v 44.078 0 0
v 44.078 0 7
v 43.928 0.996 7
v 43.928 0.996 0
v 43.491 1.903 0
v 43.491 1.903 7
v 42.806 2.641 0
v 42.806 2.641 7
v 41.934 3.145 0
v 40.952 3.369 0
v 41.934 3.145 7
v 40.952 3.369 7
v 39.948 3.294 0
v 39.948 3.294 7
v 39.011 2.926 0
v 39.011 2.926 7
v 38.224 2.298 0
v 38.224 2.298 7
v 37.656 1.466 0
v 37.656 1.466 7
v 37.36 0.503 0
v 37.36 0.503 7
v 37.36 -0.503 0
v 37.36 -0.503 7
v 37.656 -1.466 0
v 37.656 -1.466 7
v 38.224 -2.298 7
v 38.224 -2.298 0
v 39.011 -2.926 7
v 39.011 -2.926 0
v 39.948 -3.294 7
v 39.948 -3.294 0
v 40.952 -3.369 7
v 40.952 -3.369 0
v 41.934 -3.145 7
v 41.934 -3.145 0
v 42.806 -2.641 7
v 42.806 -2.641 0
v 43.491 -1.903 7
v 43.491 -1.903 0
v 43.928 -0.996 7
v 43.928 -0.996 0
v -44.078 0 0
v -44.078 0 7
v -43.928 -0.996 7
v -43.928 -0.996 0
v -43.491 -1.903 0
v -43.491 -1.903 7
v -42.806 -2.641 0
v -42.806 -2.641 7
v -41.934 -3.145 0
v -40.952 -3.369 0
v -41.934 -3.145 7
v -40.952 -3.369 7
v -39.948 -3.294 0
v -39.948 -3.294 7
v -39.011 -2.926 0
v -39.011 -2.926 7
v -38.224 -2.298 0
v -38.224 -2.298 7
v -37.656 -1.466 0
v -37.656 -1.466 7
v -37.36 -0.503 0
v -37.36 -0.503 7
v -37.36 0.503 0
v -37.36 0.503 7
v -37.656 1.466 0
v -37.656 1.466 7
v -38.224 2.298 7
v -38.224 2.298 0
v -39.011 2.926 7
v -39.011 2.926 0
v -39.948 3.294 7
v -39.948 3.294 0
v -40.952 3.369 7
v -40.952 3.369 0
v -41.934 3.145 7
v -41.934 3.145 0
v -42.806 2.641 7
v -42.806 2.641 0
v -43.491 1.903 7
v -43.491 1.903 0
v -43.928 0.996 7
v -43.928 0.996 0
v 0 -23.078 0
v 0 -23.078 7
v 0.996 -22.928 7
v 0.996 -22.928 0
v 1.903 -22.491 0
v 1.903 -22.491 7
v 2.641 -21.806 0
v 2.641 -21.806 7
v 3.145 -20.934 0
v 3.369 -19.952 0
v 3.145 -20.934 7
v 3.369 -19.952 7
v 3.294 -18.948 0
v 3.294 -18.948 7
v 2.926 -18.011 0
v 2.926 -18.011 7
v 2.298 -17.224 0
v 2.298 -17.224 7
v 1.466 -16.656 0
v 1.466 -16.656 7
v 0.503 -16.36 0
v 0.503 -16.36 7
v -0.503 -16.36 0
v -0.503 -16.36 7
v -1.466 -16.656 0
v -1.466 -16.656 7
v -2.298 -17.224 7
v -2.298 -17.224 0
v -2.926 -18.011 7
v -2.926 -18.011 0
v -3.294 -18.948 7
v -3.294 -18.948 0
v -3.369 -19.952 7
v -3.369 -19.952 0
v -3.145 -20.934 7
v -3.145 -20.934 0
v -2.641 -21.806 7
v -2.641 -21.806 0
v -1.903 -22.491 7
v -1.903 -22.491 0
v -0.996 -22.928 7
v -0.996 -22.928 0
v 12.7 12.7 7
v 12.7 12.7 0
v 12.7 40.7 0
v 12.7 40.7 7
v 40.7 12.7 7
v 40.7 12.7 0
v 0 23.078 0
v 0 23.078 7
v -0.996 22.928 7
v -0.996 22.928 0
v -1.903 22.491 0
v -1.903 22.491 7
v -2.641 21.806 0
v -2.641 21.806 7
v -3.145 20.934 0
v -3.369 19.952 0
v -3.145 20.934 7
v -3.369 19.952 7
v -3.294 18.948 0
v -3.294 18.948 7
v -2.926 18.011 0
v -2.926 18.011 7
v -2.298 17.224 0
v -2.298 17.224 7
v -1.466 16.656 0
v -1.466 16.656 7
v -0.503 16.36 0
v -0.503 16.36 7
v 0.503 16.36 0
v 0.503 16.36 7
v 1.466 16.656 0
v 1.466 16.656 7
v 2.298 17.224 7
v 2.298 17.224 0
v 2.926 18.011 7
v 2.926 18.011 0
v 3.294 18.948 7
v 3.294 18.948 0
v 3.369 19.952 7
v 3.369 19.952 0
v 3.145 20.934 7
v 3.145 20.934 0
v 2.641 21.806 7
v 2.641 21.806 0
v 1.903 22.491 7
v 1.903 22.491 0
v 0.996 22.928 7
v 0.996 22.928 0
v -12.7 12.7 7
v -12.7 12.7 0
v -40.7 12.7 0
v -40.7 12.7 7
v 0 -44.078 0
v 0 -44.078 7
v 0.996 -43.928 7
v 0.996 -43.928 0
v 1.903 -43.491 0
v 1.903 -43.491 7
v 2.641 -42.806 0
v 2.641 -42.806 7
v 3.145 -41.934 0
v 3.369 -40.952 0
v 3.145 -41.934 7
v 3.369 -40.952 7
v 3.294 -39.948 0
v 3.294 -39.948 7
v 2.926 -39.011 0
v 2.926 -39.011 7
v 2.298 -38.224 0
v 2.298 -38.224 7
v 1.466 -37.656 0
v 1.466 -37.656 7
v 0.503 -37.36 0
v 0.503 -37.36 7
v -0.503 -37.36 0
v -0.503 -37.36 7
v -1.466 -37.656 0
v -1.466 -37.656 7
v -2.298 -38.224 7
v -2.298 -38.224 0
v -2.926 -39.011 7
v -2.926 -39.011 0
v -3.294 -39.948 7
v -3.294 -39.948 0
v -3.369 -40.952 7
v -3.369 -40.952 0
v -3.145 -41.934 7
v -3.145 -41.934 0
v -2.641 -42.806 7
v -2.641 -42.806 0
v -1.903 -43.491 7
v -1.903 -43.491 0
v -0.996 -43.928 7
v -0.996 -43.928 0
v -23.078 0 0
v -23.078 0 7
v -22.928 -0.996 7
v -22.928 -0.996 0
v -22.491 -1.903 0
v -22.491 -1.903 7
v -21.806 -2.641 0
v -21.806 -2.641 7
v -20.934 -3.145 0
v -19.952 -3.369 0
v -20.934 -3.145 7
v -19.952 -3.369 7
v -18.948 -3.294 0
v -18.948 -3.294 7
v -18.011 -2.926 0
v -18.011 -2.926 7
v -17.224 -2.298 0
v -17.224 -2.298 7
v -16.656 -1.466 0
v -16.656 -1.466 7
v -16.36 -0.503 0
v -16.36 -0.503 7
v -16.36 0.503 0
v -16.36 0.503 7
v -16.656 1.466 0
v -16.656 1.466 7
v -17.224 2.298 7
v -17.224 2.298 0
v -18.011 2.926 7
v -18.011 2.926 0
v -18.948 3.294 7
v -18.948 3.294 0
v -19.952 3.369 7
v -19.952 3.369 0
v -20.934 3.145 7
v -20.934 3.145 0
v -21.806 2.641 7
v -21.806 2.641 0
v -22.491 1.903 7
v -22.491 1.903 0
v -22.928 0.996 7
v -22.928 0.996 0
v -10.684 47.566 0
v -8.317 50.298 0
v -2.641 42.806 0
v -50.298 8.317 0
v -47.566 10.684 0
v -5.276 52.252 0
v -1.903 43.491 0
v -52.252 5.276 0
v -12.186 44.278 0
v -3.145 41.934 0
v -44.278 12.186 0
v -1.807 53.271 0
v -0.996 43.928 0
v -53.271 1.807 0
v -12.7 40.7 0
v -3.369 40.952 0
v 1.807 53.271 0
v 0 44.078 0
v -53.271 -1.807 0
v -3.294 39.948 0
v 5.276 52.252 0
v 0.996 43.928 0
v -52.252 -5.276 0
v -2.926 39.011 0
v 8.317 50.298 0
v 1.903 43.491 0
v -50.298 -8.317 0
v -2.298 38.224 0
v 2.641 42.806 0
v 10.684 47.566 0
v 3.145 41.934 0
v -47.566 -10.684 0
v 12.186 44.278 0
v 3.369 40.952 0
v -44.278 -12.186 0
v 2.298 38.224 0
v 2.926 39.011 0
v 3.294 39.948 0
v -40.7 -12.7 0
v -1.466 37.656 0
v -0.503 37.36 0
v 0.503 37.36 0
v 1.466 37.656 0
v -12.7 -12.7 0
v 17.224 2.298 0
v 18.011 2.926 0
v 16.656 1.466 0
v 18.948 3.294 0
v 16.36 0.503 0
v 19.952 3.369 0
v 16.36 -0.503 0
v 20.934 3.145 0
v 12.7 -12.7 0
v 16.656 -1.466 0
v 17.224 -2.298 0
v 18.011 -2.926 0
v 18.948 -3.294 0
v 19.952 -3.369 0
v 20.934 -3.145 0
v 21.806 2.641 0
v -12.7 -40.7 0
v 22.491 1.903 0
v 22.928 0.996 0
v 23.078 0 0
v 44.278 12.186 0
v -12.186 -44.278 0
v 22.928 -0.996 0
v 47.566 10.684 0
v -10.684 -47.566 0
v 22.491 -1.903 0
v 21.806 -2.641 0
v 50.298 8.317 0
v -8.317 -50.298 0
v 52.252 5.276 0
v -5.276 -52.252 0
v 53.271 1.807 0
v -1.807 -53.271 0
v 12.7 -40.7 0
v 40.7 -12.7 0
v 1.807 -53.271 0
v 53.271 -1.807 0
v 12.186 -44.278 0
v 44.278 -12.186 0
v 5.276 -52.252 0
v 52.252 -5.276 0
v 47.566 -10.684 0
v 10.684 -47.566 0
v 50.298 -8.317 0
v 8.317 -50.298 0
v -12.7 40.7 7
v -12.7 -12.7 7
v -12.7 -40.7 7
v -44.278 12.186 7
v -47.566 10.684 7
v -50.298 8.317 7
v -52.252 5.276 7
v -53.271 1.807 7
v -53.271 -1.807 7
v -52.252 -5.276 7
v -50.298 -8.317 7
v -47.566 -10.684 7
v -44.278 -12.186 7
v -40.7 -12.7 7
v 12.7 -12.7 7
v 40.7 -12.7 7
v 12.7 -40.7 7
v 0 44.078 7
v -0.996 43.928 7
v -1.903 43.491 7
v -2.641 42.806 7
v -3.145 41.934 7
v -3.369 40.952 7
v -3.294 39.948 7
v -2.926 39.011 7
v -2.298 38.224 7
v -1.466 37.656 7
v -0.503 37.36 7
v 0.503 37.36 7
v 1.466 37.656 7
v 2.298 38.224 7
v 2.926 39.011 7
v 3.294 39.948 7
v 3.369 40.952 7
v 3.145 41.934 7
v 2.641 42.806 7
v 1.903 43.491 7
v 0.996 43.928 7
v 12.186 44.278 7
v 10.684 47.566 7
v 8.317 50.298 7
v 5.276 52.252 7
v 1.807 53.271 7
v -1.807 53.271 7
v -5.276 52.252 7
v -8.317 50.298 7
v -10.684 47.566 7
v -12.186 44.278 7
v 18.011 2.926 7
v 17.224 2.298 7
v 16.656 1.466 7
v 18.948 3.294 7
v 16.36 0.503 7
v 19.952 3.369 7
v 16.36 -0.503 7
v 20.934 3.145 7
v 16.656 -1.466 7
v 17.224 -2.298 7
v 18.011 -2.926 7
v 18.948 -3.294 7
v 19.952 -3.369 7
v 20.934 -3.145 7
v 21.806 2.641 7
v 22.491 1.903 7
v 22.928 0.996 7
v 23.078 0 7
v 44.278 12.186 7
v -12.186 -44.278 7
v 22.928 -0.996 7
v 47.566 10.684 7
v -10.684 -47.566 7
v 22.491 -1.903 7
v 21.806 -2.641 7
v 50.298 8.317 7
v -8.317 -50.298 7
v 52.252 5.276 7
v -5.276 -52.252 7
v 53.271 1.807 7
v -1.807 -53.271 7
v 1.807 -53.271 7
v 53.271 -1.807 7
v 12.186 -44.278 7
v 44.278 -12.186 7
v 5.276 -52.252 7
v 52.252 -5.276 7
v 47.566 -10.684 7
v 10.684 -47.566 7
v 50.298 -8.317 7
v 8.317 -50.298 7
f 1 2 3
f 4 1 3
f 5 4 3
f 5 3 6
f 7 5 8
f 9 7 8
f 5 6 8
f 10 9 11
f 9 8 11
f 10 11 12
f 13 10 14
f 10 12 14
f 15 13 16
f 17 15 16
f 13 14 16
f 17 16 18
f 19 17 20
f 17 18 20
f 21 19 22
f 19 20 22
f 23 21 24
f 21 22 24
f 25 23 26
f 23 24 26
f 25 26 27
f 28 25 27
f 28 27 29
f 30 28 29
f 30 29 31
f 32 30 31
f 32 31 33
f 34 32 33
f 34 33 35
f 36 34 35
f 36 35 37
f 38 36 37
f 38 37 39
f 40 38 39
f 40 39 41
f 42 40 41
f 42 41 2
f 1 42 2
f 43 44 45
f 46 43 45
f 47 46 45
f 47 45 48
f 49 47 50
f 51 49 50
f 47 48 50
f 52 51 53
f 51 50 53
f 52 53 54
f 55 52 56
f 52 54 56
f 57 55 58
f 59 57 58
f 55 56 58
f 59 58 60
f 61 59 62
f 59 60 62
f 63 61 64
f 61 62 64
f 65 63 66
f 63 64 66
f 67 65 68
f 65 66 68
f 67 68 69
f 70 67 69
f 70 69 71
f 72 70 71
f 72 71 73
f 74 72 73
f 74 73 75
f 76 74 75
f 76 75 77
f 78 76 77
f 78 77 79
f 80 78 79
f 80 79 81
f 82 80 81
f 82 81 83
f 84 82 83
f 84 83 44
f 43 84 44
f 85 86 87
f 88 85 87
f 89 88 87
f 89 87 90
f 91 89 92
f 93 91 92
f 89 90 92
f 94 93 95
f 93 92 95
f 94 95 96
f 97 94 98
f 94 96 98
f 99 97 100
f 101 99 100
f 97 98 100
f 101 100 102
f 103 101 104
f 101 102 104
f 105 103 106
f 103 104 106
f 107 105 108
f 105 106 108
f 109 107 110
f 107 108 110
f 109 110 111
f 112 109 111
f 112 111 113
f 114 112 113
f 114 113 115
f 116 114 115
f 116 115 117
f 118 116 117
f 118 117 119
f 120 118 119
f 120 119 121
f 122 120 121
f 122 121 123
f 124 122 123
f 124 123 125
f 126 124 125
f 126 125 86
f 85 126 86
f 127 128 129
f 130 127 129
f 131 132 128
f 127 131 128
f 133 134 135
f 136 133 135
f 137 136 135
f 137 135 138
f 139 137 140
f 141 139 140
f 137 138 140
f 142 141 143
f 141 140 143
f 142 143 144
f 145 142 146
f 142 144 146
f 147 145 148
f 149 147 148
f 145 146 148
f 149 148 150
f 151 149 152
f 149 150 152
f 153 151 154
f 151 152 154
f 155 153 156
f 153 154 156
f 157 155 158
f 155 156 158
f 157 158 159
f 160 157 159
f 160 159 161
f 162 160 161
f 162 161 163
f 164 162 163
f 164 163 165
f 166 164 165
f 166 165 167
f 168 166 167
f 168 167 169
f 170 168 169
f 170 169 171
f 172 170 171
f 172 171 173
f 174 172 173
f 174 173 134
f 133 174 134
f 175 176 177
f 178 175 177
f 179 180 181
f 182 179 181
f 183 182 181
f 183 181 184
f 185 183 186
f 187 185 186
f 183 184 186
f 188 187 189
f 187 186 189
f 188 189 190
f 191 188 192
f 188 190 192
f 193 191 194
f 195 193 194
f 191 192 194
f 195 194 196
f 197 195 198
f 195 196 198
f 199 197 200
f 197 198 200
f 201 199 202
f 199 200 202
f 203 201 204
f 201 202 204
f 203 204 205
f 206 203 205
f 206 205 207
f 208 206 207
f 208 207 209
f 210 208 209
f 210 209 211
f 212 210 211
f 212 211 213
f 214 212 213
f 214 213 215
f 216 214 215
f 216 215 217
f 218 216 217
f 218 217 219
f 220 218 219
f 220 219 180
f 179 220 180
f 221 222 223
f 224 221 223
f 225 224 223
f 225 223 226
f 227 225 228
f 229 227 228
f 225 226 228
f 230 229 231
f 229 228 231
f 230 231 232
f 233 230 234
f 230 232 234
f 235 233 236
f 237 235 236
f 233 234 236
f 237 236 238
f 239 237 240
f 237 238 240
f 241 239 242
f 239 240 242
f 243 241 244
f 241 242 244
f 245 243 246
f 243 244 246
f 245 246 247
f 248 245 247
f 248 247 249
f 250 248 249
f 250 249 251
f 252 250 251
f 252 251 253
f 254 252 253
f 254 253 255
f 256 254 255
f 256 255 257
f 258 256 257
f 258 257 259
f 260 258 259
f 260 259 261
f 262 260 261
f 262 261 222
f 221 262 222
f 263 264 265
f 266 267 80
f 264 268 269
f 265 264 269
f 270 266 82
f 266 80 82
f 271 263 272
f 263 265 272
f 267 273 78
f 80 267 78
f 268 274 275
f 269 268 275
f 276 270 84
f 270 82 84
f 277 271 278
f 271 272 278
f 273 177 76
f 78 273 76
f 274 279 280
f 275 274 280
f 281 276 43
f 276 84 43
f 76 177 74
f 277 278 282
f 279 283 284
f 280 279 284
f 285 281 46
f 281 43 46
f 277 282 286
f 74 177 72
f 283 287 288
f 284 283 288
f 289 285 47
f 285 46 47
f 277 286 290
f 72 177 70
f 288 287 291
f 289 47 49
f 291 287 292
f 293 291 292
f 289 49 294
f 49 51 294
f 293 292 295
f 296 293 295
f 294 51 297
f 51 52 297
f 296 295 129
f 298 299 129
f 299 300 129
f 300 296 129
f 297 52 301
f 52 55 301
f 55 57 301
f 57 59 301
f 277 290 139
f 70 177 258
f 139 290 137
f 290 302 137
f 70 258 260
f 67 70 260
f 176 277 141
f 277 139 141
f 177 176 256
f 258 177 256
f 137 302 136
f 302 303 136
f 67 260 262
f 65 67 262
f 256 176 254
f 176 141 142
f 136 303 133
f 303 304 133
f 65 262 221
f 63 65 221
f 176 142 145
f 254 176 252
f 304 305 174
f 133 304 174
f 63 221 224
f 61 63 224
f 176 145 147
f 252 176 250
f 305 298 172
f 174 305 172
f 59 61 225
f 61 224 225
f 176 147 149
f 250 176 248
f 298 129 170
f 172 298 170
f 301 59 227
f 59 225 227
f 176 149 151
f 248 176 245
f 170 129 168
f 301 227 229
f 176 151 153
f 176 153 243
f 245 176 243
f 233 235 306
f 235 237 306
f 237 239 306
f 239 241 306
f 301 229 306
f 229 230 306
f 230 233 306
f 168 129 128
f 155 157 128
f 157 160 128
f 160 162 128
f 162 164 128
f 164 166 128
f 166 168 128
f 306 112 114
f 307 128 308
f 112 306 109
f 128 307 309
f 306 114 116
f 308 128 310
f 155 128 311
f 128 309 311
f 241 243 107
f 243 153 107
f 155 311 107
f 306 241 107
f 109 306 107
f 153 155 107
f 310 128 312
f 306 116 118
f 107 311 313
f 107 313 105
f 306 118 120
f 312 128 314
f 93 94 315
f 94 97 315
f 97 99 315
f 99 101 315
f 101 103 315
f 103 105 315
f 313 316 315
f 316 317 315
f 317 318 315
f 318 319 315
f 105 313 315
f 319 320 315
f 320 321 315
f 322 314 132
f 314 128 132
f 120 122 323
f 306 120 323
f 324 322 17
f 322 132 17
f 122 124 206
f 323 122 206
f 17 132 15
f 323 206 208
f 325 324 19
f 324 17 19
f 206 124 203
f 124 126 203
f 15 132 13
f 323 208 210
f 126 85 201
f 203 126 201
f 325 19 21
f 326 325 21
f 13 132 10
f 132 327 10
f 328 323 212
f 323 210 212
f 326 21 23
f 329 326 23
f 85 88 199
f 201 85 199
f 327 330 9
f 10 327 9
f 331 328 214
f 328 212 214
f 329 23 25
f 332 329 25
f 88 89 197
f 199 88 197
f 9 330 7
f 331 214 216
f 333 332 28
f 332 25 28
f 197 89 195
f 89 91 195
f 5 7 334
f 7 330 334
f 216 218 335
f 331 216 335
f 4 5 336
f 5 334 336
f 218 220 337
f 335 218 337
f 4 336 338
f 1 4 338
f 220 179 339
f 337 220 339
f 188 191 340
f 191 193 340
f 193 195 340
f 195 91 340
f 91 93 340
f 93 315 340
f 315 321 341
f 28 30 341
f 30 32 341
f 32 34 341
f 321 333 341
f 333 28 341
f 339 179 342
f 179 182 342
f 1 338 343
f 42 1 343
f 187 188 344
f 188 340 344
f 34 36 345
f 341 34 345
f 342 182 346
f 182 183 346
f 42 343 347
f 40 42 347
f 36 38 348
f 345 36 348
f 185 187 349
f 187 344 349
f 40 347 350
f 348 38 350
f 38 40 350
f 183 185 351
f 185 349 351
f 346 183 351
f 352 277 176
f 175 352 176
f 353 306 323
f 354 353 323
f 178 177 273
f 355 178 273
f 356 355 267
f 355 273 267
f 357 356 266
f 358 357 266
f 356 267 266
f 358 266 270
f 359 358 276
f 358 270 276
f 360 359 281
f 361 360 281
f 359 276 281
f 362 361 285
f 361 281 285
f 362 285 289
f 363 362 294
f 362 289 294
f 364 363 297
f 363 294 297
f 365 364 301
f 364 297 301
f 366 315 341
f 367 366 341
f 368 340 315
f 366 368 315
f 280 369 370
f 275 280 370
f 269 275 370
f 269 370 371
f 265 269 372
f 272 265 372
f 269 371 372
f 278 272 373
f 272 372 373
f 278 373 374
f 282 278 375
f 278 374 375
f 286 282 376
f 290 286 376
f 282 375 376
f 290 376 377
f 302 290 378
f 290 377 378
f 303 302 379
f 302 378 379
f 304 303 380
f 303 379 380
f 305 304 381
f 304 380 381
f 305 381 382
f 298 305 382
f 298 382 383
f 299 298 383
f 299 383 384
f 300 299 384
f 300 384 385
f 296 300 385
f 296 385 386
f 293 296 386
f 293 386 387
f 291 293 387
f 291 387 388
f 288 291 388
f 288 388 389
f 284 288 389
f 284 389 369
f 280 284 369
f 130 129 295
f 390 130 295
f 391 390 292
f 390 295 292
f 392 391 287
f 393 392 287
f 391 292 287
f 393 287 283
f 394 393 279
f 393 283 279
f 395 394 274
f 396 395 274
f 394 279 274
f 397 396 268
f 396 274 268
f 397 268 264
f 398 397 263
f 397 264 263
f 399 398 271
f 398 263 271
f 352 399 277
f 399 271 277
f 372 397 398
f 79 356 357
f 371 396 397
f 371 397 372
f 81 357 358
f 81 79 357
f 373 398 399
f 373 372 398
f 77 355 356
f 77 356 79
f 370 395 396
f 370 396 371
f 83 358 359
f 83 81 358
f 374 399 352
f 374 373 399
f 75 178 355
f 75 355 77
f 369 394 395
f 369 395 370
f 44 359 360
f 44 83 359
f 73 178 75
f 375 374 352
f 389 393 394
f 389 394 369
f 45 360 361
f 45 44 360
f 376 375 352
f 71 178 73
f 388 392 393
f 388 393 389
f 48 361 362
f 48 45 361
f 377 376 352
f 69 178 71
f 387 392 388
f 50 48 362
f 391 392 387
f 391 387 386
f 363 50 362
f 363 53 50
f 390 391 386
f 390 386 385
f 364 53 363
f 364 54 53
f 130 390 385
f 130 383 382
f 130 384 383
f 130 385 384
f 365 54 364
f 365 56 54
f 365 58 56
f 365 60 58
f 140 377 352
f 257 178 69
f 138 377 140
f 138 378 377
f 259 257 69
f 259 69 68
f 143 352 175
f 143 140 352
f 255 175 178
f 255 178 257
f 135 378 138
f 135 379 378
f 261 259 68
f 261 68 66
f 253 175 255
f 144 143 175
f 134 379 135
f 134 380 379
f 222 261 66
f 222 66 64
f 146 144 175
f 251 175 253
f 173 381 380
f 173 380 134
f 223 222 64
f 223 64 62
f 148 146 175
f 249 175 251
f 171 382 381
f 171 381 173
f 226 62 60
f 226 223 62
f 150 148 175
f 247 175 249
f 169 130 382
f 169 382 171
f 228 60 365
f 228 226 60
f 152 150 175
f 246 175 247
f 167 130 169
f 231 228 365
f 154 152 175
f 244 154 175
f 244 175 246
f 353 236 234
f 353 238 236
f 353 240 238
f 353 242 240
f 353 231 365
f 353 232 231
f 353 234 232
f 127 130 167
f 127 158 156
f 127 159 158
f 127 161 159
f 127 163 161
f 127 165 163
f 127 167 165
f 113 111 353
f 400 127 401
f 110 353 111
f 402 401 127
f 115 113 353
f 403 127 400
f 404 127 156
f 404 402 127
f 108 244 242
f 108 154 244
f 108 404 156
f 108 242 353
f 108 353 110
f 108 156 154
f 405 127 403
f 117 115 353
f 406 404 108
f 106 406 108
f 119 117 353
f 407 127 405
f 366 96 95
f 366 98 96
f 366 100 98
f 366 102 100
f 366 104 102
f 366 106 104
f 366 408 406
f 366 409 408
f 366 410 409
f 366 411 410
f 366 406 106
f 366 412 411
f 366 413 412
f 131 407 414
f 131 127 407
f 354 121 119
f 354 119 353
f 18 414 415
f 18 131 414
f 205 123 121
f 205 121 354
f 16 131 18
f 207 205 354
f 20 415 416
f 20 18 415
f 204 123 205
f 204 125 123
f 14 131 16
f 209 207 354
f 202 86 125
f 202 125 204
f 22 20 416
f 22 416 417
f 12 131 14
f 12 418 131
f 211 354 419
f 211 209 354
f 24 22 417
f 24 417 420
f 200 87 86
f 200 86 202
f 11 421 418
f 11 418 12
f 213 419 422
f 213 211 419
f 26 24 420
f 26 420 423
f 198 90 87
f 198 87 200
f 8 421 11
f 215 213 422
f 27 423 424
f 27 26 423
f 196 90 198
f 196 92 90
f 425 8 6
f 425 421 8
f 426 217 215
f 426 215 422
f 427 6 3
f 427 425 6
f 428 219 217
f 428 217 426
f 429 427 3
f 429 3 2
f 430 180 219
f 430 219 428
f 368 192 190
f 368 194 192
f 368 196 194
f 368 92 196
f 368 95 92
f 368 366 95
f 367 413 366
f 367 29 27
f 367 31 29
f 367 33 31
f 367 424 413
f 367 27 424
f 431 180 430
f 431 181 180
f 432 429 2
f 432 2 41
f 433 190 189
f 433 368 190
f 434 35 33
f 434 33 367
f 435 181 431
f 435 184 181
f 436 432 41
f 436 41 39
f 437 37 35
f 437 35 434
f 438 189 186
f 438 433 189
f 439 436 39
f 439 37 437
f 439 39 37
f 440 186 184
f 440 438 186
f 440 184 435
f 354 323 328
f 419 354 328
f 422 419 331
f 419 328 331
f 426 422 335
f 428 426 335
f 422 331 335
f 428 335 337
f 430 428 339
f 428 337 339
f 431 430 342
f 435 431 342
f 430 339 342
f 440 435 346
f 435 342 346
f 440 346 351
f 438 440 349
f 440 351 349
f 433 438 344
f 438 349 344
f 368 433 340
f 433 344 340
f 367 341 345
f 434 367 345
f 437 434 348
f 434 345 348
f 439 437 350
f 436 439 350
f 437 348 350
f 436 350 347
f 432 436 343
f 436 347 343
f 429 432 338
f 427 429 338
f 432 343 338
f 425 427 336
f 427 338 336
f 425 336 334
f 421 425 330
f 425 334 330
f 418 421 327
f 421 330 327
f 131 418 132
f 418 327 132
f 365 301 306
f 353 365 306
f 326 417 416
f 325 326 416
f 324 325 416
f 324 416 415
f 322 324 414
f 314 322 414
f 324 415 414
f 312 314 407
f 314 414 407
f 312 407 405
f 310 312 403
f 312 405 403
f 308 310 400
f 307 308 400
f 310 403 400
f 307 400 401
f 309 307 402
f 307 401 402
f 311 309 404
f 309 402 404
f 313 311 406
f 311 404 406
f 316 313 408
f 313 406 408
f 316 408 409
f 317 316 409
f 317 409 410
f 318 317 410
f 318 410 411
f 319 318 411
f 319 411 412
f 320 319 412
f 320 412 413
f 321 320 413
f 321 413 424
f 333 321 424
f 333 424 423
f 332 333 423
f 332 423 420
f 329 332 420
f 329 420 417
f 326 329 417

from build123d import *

# Parameters (mm, degrees)
F3_DEPTH = 7
F4_D     = 6.7564
F5_COUNT = 4


with BuildPart() as f3:
    # F1 (on Top) → F3 (new body)
    with BuildSketch(Plane.XY):
        with BuildLine():
            Line((-28.5, 12.7), (-40.7, 12.7))
            ThreePointArc((-40.7, 12.7), (-53.4, 0), (-40.7, -12.7))
            Line((-40.7, -12.7), (-28.5, -12.7))
            Line((-28.5, -12.7), (-12.7, -12.7))
            Line((-12.7, -12.7), (0, 0))
            Line((0, 0), (-12.7, 12.7))
            Line((-12.7, 12.7), (-28.5, 12.7))
        make_face()
    extrude(amount=F3_DEPTH)

    # F4 (through all)
    with Locations(Plane(origin=(0, 0, 0), x_dir=(1, 0, 0), z_dir=(0, 0, -1))):
        with Locations((-40.7, 0), (-19.7, 0)):
            Hole(F4_D / 2)

    # F5: F3 ×4 about axis
    f5_axis = Axis((0, 0, 15.328399837), (0, 0, 1))


with BuildPart() as f3_1:
    add(f3.part)
    for i in range(1, F5_COUNT):
        add(f3.part.rotate(f5_axis, i * 360 / F5_COUNT))


solid = f3_1.part
